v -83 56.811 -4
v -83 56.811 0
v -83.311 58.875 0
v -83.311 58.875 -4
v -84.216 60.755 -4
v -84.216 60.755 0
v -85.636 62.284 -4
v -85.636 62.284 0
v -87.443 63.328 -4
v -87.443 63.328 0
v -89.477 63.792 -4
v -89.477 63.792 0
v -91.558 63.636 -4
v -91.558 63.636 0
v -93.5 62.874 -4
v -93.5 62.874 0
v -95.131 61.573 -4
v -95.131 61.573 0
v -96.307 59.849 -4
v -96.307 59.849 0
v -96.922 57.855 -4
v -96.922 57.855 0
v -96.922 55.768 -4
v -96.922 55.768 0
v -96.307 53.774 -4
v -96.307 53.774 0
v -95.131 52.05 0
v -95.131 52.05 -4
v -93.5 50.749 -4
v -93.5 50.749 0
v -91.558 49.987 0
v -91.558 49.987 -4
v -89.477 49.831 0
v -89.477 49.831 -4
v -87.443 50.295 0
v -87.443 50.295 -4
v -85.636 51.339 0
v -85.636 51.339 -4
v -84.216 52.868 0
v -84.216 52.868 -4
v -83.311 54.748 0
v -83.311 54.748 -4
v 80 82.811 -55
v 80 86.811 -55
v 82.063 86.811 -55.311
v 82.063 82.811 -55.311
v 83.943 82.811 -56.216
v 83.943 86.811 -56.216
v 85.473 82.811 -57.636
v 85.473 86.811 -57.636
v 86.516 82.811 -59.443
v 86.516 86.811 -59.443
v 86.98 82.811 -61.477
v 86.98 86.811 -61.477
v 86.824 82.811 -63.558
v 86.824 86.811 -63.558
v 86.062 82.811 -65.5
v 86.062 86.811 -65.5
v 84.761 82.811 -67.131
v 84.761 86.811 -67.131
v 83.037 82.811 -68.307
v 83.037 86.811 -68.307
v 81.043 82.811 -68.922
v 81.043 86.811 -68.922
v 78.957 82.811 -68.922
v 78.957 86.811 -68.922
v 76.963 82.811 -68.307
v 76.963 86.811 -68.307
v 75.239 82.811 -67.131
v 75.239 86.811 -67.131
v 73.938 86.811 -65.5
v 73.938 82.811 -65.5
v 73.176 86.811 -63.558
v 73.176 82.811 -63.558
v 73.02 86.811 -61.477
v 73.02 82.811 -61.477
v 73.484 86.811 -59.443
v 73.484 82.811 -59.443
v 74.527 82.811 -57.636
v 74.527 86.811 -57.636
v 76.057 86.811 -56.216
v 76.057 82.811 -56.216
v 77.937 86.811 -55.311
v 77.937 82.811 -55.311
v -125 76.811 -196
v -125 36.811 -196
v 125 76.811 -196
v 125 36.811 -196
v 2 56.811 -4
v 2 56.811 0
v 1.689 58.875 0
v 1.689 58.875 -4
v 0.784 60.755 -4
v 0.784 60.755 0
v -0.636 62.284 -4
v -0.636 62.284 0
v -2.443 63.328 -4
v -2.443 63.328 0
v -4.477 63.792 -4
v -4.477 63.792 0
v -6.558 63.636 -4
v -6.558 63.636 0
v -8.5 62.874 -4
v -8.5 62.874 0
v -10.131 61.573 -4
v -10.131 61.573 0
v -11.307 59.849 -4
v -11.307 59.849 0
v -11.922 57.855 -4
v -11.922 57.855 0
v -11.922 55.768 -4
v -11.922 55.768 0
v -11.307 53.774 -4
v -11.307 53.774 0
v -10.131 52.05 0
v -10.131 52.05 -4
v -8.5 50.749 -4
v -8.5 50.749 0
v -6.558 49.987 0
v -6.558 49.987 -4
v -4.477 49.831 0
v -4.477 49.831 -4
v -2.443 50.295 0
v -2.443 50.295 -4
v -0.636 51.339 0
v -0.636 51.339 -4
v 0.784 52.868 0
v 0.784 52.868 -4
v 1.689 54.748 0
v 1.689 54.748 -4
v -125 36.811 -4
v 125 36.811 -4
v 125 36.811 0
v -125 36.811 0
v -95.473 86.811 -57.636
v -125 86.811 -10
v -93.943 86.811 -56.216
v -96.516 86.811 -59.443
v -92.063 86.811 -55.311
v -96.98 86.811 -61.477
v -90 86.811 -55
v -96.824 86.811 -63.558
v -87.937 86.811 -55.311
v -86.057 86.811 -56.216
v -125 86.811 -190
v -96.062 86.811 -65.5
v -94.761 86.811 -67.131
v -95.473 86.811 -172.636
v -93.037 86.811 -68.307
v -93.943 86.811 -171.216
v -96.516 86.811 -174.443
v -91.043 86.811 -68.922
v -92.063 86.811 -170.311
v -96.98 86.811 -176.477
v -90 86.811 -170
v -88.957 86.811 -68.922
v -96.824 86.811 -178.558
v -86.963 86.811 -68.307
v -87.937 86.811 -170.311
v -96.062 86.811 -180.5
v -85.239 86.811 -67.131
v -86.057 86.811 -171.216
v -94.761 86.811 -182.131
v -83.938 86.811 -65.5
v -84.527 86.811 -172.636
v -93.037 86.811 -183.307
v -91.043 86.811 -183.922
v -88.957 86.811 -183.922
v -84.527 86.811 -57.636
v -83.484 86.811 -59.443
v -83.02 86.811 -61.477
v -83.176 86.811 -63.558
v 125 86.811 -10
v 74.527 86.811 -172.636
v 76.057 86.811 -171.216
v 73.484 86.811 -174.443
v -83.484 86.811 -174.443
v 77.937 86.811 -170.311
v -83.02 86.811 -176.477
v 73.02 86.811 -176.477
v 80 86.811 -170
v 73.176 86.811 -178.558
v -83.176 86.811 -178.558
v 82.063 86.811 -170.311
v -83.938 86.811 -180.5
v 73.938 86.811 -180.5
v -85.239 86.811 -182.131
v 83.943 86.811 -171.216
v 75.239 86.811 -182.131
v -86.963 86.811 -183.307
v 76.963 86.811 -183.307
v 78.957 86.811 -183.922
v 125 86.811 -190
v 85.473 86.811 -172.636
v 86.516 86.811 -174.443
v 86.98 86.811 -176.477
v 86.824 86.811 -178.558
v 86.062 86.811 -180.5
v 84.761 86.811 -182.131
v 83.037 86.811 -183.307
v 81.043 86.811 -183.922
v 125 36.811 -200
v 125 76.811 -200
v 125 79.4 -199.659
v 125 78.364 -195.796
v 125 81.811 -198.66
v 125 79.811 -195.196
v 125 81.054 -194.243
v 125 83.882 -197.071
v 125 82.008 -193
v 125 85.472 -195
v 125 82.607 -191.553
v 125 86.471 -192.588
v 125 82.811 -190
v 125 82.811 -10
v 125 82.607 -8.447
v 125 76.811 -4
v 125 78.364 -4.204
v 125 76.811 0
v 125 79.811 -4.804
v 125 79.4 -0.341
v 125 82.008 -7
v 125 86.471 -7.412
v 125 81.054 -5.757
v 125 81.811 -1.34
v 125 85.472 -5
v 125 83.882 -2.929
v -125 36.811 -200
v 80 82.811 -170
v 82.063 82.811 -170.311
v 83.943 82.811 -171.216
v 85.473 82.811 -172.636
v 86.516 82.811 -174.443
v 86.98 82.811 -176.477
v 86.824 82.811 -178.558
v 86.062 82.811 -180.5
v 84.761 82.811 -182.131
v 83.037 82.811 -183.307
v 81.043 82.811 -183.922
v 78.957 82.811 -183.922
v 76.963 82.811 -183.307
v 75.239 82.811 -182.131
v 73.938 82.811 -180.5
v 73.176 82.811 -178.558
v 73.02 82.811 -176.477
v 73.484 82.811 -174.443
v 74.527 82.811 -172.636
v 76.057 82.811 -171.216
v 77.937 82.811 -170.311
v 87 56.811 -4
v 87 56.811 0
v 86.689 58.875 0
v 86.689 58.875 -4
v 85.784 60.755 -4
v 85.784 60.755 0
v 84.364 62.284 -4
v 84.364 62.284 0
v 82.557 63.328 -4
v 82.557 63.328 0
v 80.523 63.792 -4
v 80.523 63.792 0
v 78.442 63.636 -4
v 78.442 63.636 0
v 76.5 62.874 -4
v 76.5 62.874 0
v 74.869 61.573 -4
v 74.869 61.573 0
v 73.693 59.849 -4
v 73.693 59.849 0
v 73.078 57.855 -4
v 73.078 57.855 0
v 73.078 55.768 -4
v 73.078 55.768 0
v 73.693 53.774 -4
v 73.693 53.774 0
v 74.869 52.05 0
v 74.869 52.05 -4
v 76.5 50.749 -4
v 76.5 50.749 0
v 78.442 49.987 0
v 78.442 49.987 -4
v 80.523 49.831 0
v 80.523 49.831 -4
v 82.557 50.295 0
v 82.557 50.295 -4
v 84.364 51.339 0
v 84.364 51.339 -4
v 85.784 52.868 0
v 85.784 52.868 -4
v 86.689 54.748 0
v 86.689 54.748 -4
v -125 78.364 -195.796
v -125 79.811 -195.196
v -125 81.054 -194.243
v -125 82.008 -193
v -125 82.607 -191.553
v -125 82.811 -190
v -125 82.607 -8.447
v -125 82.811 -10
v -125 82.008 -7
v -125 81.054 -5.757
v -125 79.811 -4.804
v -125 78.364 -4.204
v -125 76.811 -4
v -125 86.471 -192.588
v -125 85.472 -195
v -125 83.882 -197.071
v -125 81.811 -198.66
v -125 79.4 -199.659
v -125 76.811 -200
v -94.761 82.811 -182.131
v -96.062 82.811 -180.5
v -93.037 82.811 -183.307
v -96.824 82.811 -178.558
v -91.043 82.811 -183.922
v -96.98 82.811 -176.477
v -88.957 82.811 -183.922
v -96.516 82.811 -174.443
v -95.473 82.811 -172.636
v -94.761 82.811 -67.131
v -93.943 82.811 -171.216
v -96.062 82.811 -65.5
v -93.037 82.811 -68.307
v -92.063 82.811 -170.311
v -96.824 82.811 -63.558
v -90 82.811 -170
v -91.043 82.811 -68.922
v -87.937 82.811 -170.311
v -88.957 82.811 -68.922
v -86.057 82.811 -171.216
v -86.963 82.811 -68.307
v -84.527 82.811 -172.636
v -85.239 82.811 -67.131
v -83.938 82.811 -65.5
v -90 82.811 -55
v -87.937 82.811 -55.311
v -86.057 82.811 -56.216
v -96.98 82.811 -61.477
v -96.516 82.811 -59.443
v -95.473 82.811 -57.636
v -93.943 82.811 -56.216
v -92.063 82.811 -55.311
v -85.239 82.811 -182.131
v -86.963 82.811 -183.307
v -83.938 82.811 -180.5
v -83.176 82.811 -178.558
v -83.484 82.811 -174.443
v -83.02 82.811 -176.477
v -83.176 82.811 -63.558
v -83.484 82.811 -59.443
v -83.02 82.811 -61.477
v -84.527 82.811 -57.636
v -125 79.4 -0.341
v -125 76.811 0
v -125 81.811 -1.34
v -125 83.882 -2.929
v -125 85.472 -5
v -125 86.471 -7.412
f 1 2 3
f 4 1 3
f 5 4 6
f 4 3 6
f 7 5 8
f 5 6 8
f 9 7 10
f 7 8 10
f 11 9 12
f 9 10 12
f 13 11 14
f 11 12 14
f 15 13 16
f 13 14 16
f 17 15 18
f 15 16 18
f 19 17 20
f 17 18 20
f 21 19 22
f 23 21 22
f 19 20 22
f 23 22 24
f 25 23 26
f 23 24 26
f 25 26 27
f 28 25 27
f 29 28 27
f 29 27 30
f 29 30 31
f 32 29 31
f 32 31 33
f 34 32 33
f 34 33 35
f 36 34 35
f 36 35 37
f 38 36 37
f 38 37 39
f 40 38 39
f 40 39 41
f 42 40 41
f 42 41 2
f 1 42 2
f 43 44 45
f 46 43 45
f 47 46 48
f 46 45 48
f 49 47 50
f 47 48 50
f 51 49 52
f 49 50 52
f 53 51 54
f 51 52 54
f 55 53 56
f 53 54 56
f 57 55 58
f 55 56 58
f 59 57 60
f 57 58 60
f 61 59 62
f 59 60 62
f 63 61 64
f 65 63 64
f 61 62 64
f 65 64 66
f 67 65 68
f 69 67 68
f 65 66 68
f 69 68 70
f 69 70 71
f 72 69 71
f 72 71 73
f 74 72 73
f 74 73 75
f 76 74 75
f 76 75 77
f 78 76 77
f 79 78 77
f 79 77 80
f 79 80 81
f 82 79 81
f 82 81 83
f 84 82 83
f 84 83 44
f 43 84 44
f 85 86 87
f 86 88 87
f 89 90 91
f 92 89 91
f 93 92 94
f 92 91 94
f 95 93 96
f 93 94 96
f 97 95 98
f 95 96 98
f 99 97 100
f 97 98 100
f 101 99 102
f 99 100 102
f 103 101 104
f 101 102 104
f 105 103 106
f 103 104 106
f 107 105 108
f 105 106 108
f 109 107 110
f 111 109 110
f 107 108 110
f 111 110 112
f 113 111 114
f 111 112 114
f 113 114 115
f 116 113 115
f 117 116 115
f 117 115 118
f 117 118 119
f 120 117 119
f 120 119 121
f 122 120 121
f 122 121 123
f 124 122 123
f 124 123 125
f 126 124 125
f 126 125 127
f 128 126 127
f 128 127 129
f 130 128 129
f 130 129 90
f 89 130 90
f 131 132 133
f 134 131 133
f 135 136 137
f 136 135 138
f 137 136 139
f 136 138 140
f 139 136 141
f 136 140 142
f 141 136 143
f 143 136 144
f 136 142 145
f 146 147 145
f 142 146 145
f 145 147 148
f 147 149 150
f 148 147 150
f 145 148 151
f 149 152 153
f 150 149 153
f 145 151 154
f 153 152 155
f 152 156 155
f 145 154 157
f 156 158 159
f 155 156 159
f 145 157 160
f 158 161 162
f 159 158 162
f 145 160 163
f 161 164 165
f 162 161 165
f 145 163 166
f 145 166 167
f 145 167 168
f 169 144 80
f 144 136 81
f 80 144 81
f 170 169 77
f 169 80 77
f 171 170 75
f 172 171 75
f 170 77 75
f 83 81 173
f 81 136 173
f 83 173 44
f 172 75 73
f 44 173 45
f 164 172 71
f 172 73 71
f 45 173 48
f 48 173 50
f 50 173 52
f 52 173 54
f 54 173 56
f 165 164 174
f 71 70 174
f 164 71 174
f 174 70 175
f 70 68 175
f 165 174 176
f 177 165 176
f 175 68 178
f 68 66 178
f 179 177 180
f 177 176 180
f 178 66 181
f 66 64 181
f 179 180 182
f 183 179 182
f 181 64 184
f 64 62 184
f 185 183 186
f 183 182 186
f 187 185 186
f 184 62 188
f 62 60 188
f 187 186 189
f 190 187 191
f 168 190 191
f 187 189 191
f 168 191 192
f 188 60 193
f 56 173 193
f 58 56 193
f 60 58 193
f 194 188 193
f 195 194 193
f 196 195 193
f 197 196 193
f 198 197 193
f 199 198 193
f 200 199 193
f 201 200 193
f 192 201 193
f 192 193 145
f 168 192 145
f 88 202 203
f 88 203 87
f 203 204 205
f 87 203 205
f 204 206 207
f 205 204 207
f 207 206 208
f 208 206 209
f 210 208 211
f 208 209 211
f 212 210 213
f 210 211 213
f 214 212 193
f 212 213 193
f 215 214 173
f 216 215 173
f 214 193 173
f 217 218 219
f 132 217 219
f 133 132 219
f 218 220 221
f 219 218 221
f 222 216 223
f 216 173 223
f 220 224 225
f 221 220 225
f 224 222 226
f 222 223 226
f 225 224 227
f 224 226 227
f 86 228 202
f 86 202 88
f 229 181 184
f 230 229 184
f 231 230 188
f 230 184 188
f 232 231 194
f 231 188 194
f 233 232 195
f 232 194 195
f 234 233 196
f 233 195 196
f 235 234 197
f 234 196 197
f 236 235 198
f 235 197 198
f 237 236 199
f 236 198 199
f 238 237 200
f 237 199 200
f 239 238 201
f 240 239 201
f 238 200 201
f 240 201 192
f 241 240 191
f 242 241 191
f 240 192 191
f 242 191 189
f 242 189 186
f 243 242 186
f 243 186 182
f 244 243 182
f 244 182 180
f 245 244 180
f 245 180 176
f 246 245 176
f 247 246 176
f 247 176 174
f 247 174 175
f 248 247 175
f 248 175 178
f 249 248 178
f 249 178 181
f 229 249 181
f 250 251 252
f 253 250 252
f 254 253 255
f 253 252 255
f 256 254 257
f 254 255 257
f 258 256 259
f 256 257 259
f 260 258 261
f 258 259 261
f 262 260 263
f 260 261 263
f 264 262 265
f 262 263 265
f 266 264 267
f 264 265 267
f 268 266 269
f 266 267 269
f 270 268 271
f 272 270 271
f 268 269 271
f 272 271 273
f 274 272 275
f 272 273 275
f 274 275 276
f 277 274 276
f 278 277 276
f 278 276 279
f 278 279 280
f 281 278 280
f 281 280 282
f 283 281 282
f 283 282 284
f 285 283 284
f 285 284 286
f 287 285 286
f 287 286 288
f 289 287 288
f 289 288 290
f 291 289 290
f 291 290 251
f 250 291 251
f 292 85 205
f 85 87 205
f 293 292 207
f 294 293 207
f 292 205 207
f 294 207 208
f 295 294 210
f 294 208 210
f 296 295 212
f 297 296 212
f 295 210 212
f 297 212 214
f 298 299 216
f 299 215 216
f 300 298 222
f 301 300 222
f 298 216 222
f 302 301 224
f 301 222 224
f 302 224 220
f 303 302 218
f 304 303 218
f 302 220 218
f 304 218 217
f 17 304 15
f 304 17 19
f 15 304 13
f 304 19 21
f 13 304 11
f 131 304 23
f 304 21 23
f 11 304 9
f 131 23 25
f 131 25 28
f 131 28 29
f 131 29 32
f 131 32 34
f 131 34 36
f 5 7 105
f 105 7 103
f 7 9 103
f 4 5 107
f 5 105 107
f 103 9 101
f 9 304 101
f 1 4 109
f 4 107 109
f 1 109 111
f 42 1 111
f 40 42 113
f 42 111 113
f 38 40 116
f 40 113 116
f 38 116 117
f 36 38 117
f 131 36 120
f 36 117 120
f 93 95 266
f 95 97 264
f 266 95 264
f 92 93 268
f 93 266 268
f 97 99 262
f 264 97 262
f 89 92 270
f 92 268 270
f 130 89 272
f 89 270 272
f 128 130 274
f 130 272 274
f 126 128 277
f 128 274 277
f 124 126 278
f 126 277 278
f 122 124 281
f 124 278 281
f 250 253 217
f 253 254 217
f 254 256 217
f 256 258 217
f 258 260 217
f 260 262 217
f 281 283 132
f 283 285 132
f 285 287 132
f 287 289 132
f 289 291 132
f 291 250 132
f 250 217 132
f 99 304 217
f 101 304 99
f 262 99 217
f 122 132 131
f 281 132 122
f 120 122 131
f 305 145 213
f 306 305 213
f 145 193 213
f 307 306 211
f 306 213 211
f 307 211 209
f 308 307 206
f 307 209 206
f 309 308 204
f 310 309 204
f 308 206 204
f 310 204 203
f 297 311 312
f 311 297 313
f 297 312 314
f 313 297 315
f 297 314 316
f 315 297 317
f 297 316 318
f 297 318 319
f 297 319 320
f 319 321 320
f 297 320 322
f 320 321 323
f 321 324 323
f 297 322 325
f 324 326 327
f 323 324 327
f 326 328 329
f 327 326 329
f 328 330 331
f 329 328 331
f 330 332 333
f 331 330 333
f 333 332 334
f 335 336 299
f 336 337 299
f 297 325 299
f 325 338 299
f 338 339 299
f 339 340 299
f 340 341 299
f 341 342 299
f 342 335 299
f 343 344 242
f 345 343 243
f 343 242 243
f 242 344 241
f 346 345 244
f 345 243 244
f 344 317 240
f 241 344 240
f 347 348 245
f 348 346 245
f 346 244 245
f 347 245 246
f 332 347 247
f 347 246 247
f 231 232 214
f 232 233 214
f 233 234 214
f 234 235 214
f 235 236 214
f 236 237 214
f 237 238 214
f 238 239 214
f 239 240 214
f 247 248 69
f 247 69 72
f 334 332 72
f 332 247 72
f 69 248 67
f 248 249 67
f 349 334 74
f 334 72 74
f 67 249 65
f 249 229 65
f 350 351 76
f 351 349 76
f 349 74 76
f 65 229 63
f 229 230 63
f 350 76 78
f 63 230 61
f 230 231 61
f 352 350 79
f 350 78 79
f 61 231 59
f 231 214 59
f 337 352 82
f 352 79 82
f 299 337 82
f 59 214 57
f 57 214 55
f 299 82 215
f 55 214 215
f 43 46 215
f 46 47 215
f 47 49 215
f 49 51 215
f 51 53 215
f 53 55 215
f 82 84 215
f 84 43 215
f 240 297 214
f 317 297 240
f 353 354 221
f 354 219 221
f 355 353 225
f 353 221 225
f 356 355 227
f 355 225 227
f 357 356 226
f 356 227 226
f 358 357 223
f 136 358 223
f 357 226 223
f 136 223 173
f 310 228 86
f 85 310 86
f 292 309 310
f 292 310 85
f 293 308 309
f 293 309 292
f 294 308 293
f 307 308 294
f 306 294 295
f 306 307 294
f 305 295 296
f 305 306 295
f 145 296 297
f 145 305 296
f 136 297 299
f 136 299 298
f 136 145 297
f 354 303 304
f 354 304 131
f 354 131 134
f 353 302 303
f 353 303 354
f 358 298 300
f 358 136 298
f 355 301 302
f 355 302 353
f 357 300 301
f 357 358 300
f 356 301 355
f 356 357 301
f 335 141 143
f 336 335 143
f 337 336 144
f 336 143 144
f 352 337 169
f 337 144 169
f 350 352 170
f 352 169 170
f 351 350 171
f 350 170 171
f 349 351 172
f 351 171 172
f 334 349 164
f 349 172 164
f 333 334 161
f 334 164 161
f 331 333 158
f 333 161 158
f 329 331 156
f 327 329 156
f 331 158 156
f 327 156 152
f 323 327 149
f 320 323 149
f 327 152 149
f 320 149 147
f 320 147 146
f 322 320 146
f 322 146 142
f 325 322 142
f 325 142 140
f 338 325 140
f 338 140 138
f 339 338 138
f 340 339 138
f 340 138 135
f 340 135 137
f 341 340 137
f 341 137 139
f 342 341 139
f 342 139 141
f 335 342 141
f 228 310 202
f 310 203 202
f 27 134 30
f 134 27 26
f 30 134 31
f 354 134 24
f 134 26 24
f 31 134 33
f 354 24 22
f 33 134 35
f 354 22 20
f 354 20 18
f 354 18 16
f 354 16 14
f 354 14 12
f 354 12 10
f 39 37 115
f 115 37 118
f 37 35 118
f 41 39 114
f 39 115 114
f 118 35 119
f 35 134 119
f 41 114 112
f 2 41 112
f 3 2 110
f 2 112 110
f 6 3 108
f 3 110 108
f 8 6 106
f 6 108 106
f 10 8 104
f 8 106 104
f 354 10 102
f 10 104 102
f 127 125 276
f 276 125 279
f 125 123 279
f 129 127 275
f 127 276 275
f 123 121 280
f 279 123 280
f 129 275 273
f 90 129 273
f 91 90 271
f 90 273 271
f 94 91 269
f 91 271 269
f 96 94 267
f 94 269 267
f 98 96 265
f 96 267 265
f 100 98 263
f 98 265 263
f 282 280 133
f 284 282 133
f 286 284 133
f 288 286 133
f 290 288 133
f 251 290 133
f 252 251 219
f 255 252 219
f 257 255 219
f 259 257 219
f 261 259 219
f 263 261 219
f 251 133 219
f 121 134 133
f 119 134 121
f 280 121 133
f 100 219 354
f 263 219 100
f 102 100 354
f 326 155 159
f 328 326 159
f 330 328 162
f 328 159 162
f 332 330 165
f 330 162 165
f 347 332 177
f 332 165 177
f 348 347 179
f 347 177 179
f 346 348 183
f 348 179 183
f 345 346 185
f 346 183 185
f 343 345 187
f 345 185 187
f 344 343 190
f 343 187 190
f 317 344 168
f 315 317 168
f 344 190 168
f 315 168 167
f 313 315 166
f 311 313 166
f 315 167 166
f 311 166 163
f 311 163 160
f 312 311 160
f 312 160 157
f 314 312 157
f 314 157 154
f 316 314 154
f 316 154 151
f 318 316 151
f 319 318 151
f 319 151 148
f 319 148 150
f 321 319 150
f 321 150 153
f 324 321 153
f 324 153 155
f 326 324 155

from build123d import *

# Parameters (mm, degrees)
BASE_FLANGE1_DEPTH = 125
SKETCH6_R          = 7
CUT_EXTRUDE1_DEPTH = 10
SKETCH7_R          = 7
CUT_EXTRUDE2_DEPTH = 10


# Sheet-metal steps are written as plain solids
with BuildPart() as part:
    # Sketch1 → Base-Flange1 (new, symmetric)
    with BuildSketch(Plane(origin=(0, 0, 0), x_dir=(0, 0, -1), z_dir=(1, 0, 0))):
        with BuildLine():
            Line((0, 36.811428571), (0, 76.811428571))
            ThreePointArc((0, 76.811428571), (2.928932188, 83.882496383), (10, 86.811428571))
            Line((10, 86.811428571), (190, 86.811428571))
            ThreePointArc((190, 86.811428571), (197.071067812, 83.882496383), (200, 76.811428571))
            Line((200, 76.811428571), (200, 36.811428571))
            Line((200, 36.811428571), (196, 36.811428571))
            Line((196, 36.811428571), (196, 76.811428571))
            ThreePointArc((196, 76.811428571), (194.242640687, 81.054069259), (190, 82.811428571))
            Line((190, 82.811428571), (10, 82.811428571))
            ThreePointArc((10, 82.811428571), (5.757359313, 81.054069259), (4, 76.811428571))
            Line((4, 76.811428571), (4, 36.811428571))
            Line((4, 36.811428571), (0, 36.811428571))
        make_face()
    extrude(amount=BASE_FLANGE1_DEPTH, both=True)

    # Sketch6 → Cut-Extrude1 (cut)
    with BuildSketch(Plane(origin=(0, 86.811428571, 0), x_dir=(1, 0, 0), z_dir=(0, 1, 0))):
        with Locations(Location((-90, 177, 0), (0, 0, 270))):
            Circle(SKETCH6_R)
        with Locations(Location((80, 177, 0), (0, 0, 270))):
            Circle(SKETCH6_R)
        with Locations(Location((80, 62, 0), (0, 0, 270))):
            Circle(SKETCH6_R)
        with Locations(Location((-90, 62, 0), (0, 0, 270))):
            Circle(SKETCH6_R)
    extrude(amount=-CUT_EXTRUDE1_DEPTH, mode=Mode.SUBTRACT)

    # Sketch7 → Cut-Extrude2 (cut)
    with BuildSketch(Plane.XY):
        with Locations((-90, 56.811428571)):
            Circle(SKETCH7_R)
        with Locations((-5, 56.811428571)):
            Circle(SKETCH7_R)
        with Locations((80, 56.811428571)):
            Circle(SKETCH7_R)
    extrude(amount=-CUT_EXTRUDE2_DEPTH, mode=Mode.SUBTRACT)


solid = part.part
